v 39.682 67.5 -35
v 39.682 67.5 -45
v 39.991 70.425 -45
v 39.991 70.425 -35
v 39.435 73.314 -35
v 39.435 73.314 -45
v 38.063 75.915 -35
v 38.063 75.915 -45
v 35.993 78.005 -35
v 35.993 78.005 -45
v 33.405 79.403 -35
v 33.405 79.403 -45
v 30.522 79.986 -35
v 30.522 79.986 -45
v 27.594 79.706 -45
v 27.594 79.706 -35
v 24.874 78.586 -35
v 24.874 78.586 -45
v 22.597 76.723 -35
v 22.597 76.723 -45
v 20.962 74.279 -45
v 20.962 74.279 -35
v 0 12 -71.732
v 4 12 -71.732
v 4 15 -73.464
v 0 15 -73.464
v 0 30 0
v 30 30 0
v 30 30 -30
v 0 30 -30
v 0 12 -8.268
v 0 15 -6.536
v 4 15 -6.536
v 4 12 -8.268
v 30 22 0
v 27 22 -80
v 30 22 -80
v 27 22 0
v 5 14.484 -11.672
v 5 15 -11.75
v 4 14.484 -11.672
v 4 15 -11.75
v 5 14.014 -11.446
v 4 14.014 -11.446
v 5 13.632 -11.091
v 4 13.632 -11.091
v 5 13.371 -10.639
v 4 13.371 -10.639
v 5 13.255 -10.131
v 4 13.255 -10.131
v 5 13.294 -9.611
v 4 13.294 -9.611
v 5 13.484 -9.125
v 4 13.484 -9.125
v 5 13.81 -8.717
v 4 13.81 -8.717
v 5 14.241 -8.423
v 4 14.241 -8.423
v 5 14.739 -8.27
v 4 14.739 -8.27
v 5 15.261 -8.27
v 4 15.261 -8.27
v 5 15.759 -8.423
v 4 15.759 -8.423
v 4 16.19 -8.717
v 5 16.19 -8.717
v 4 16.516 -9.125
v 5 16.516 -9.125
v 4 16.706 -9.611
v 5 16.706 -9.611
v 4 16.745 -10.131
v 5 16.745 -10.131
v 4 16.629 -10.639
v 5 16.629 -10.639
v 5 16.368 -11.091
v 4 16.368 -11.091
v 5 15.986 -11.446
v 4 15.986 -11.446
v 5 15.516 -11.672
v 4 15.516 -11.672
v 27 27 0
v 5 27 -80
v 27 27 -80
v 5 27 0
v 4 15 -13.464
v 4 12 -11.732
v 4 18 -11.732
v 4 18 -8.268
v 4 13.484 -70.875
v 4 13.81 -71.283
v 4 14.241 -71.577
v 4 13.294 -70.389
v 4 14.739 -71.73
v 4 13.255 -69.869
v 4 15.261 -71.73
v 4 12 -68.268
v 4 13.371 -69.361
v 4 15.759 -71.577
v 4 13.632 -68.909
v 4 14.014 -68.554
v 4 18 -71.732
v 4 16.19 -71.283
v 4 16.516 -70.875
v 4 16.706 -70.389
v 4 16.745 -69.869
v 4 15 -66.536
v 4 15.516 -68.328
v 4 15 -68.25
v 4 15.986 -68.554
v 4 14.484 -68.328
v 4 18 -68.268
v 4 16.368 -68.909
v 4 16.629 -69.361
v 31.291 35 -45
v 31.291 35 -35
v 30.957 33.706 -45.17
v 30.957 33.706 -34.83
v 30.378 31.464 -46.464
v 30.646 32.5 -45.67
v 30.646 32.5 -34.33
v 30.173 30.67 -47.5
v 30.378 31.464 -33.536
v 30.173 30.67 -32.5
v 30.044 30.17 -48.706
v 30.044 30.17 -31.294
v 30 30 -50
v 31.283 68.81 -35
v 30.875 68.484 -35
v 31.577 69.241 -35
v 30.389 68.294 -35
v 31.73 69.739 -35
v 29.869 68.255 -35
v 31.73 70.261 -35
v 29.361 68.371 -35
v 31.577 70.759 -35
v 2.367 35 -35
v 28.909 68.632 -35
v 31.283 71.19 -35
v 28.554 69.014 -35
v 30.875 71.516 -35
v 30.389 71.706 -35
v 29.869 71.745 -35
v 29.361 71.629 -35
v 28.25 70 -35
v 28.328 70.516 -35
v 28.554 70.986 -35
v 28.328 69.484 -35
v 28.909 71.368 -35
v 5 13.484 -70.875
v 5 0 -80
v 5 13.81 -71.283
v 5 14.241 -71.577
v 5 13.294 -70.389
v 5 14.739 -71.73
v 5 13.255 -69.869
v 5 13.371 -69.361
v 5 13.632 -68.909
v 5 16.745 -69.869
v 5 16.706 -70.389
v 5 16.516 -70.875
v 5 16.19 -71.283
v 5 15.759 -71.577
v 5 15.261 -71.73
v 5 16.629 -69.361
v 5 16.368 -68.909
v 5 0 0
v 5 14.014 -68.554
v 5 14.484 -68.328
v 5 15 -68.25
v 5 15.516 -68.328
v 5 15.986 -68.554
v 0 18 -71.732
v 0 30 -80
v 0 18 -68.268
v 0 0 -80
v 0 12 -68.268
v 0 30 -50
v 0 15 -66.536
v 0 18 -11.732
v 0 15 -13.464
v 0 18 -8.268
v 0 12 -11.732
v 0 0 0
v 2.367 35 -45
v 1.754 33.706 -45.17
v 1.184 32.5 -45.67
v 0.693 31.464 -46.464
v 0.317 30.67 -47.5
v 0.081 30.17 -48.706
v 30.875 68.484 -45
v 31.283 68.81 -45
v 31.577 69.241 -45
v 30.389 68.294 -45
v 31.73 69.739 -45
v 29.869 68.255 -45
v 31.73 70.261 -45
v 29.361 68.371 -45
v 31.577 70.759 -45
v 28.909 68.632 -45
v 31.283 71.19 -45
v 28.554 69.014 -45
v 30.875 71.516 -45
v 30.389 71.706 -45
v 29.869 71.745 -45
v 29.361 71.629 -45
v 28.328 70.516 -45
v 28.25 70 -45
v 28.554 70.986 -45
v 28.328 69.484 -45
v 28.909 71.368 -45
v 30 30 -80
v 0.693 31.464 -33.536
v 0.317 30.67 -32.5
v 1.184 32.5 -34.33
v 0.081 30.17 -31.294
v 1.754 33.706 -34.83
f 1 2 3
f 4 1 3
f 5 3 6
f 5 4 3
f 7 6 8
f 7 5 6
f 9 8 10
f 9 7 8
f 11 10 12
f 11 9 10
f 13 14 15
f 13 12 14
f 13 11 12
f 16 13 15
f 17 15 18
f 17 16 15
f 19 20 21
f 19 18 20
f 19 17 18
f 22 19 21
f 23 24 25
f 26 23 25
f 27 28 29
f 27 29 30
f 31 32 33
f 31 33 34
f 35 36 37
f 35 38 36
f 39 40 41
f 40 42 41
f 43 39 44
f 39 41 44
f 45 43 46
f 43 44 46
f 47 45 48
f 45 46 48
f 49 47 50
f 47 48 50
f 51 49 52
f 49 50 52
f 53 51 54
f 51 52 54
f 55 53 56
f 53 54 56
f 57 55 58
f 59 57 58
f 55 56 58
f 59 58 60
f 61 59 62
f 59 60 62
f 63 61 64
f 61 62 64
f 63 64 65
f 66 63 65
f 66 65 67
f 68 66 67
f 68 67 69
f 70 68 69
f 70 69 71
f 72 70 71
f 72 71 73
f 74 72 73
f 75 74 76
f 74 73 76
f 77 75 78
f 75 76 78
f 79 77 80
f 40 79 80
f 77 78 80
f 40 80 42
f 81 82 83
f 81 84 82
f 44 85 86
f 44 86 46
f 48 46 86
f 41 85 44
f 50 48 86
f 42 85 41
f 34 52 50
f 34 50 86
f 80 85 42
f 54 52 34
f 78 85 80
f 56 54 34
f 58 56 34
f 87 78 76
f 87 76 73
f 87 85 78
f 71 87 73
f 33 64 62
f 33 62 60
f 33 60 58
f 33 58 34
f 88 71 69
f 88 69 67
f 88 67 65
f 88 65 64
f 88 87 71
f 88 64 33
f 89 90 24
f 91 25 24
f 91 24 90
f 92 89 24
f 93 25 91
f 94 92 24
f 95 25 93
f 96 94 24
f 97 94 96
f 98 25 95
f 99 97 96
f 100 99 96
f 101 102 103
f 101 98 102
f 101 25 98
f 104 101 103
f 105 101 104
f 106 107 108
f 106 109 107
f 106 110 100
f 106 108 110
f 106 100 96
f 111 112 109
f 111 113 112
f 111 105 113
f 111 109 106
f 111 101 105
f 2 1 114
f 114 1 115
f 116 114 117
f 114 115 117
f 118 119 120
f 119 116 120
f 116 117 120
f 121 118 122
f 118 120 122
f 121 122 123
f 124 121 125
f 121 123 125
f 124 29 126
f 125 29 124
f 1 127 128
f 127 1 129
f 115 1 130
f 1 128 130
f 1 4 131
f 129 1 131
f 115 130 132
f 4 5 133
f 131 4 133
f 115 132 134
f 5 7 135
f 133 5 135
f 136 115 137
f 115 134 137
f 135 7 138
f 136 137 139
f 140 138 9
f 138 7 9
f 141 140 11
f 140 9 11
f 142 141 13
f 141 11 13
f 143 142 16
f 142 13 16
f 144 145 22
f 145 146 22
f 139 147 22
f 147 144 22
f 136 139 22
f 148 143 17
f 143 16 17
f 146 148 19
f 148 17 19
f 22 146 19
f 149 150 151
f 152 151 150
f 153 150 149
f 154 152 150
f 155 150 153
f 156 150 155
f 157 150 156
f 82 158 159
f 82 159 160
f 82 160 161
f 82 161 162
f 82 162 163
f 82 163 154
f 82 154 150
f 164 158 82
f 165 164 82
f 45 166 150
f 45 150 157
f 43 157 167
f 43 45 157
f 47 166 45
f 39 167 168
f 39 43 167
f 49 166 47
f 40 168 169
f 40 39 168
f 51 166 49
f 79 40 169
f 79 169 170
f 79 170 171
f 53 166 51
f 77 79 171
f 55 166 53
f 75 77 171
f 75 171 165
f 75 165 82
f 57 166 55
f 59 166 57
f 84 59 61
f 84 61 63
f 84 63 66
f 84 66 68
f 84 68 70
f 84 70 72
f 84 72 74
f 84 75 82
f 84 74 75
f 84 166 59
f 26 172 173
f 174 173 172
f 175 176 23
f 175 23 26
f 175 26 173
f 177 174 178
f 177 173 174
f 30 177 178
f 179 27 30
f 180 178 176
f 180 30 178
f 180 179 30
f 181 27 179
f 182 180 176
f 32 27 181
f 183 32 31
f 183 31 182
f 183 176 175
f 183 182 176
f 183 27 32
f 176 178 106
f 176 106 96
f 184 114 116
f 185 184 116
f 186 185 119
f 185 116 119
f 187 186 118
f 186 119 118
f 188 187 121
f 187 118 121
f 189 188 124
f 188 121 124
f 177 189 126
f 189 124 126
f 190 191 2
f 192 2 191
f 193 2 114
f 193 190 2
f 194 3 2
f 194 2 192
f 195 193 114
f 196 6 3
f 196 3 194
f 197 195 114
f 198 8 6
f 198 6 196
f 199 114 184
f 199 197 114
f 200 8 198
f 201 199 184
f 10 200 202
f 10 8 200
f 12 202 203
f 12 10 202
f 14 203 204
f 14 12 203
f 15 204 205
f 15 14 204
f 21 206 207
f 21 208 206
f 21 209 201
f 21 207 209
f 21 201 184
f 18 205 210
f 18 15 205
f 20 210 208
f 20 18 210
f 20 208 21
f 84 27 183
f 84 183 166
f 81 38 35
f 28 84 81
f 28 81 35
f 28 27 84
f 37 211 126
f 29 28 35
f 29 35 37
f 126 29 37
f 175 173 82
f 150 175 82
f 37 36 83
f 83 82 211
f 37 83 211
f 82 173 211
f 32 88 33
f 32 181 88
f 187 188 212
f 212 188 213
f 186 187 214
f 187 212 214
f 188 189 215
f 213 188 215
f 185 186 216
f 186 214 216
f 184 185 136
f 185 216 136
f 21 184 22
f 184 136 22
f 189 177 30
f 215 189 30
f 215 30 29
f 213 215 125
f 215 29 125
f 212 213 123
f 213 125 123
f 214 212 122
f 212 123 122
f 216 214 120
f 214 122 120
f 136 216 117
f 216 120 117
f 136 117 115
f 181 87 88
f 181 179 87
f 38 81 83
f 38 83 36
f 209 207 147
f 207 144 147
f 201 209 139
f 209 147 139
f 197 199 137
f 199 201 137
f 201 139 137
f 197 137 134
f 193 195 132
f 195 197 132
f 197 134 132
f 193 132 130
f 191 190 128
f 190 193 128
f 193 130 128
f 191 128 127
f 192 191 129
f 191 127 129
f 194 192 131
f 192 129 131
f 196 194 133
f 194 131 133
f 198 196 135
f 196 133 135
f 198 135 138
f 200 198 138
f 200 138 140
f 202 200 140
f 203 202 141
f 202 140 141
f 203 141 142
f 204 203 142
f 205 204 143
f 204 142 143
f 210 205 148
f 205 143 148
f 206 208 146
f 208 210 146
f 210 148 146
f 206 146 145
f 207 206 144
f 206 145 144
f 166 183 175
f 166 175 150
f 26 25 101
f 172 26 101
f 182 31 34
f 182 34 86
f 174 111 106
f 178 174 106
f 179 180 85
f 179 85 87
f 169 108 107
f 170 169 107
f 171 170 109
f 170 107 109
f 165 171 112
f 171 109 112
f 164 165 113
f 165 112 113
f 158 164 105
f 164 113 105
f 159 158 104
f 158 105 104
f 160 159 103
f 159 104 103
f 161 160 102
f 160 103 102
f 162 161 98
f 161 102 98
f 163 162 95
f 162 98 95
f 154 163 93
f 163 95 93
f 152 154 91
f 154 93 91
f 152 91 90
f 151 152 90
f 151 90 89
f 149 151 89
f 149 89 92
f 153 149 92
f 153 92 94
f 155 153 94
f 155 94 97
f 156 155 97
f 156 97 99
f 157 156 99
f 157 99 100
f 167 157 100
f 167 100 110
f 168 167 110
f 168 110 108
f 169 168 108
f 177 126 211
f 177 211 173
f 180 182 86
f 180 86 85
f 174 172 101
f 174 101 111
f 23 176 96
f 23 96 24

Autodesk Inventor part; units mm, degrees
ref_plane "YZ Plane" through (0, 0, 0) normal (1, 0, 0) x (0, 1, 0)
ref_plane "XZ Plane" through (0, 0, 0) normal (0, 1, 0) x (-1, 0, 0)
ref_plane "XY Plane" through (0, 0, 0) normal (0, 0, 1) x (1, 0, 0)
sketch "Эскиз1" plane through (0, 0, 0) normal (0, 0, 1) x (1, 0, 0)
  line L0 (30, 30) -> (0, 30)
  line L1 (0, 30) -> (0, 0)
  line L2 (30, 30) -> (30, 22)
  line L3 (5, 0) -> (5, 27)
  line L4 (5, 27) -> (27, 27)
  line L5 (27, 27) -> (27, 22)
  line L6 (0, 0) -> (5, 0)
  line L7 (27, 22) -> (30, 22)
  dimension "d0" = 30
  dimension "d2" = 30
  dimension "d5" = 5
  dimension "d6" = 8
  dimension "d15" = 3
  dimension "d16" = 3
  dimension "d17" = 5
extrude "Выдавливание1" add sketch "Эскиз1" against normal blind 80
sketch "Эскиз2" plane through (0, 0, 0) normal (-1, 0, 0) x (0, 0, 1)
  line L0 (0, 30) -> (-80, 30) projected
  line L1 (-70, 30) -> (-70, 0) construction
  line L2 (0, 0) -> (-80, 0) projected
  circle A0 centre (-70, 15) radius 3 construction
  line L3 (-68.2679, 18) -> (-66.5359, 15)
  line L4 (-66.5359, 15) -> (-68.2679, 12)
  line L5 (-68.2679, 12) -> (-71.7321, 12)
  line L6 (-71.7321, 12) -> (-73.4641, 15)
  line L7 (-73.4641, 15) -> (-71.7321, 18)
  line L8 (-71.7321, 18) -> (-68.2679, 18)
  line L9 (-80, 0) -> (-80, 30) projected
  line L10 (0, 30) -> (-80, 30) projected
  point P0 (-70, 18)
  dimension "d9" = 6
  dimension "d30" = 10
extrude "Выдавливание2" cut sketch "Эскиз2" against normal blind 4
sketch "Эскиз3" plane through (4, 0, 0) normal (-1, 0, 0) x (0, 0, 1)
  line L0 (-71.7321, 18) -> (-68.2679, 18) projected
  line L1 (-70, 18) -> (-70, 12) construction
  line L2 (-68.2679, 12) -> (-71.7321, 12) projected
  circle A0 centre (-70, 15) radius 1.75
  point P0 (0, 0)
  dimension "d18" = 3.5
extrude "Выдавливание3" cut sketch "Эскиз3" against normal up to next
ref_plane "РабПлоскость1" through (0, 0, -40) normal (0, 0, -1) x (-1, 0, 0)
sketch "Эскиз4" plane through (0, 0, -40) normal (0, 0, -1) x (-1, 0, 0)
  arc A0 (-20.9616, 74.2788) -> (-39.6825, 67.5) centre (-30, 70) ccw
  line L0 (-30, 30) -> (-30, 22) projected
  line L1 (-30, 30) -> (-39.6825, 67.5)
  line L2 (0, 30) -> (0, 0) projected
  line L3 (0, 30) -> (-20.9616, 74.2788)
  circle A1 centre (-30, 70) radius 1.75
  line L4 (-30, 22) -> (-30, 30)
  line L5 (-30, 30) -> (0, 30)
  line L6 (-30, 22) -> (-27, 22) projected
  dimension "d21" = 20
  dimension "d22" = 3.5
  dimension "d31" = 30
  dimension "d32" = 40
extrude "Выдавливание4" add sketch "Эскиз4" along normal mid plane 10
fillet "Сопряжение1" radius 5 2 edges at (15, 30, -45) (15, 30, -35)
mirror "Зеркальное отражение1" about plane through (0, 0, -40) normal (0, 0, -1) of "Выдавливание2", "Выдавливание3"
sketch "Эскиз5" plane through (5, 0, 0) normal (1, 0, 0) x (0, 0, -1)
  point P0 (0, 0)
equation "\"d6\" = d5 + d4"
equation "\"d4\" = 3"
properties part number "holder"
